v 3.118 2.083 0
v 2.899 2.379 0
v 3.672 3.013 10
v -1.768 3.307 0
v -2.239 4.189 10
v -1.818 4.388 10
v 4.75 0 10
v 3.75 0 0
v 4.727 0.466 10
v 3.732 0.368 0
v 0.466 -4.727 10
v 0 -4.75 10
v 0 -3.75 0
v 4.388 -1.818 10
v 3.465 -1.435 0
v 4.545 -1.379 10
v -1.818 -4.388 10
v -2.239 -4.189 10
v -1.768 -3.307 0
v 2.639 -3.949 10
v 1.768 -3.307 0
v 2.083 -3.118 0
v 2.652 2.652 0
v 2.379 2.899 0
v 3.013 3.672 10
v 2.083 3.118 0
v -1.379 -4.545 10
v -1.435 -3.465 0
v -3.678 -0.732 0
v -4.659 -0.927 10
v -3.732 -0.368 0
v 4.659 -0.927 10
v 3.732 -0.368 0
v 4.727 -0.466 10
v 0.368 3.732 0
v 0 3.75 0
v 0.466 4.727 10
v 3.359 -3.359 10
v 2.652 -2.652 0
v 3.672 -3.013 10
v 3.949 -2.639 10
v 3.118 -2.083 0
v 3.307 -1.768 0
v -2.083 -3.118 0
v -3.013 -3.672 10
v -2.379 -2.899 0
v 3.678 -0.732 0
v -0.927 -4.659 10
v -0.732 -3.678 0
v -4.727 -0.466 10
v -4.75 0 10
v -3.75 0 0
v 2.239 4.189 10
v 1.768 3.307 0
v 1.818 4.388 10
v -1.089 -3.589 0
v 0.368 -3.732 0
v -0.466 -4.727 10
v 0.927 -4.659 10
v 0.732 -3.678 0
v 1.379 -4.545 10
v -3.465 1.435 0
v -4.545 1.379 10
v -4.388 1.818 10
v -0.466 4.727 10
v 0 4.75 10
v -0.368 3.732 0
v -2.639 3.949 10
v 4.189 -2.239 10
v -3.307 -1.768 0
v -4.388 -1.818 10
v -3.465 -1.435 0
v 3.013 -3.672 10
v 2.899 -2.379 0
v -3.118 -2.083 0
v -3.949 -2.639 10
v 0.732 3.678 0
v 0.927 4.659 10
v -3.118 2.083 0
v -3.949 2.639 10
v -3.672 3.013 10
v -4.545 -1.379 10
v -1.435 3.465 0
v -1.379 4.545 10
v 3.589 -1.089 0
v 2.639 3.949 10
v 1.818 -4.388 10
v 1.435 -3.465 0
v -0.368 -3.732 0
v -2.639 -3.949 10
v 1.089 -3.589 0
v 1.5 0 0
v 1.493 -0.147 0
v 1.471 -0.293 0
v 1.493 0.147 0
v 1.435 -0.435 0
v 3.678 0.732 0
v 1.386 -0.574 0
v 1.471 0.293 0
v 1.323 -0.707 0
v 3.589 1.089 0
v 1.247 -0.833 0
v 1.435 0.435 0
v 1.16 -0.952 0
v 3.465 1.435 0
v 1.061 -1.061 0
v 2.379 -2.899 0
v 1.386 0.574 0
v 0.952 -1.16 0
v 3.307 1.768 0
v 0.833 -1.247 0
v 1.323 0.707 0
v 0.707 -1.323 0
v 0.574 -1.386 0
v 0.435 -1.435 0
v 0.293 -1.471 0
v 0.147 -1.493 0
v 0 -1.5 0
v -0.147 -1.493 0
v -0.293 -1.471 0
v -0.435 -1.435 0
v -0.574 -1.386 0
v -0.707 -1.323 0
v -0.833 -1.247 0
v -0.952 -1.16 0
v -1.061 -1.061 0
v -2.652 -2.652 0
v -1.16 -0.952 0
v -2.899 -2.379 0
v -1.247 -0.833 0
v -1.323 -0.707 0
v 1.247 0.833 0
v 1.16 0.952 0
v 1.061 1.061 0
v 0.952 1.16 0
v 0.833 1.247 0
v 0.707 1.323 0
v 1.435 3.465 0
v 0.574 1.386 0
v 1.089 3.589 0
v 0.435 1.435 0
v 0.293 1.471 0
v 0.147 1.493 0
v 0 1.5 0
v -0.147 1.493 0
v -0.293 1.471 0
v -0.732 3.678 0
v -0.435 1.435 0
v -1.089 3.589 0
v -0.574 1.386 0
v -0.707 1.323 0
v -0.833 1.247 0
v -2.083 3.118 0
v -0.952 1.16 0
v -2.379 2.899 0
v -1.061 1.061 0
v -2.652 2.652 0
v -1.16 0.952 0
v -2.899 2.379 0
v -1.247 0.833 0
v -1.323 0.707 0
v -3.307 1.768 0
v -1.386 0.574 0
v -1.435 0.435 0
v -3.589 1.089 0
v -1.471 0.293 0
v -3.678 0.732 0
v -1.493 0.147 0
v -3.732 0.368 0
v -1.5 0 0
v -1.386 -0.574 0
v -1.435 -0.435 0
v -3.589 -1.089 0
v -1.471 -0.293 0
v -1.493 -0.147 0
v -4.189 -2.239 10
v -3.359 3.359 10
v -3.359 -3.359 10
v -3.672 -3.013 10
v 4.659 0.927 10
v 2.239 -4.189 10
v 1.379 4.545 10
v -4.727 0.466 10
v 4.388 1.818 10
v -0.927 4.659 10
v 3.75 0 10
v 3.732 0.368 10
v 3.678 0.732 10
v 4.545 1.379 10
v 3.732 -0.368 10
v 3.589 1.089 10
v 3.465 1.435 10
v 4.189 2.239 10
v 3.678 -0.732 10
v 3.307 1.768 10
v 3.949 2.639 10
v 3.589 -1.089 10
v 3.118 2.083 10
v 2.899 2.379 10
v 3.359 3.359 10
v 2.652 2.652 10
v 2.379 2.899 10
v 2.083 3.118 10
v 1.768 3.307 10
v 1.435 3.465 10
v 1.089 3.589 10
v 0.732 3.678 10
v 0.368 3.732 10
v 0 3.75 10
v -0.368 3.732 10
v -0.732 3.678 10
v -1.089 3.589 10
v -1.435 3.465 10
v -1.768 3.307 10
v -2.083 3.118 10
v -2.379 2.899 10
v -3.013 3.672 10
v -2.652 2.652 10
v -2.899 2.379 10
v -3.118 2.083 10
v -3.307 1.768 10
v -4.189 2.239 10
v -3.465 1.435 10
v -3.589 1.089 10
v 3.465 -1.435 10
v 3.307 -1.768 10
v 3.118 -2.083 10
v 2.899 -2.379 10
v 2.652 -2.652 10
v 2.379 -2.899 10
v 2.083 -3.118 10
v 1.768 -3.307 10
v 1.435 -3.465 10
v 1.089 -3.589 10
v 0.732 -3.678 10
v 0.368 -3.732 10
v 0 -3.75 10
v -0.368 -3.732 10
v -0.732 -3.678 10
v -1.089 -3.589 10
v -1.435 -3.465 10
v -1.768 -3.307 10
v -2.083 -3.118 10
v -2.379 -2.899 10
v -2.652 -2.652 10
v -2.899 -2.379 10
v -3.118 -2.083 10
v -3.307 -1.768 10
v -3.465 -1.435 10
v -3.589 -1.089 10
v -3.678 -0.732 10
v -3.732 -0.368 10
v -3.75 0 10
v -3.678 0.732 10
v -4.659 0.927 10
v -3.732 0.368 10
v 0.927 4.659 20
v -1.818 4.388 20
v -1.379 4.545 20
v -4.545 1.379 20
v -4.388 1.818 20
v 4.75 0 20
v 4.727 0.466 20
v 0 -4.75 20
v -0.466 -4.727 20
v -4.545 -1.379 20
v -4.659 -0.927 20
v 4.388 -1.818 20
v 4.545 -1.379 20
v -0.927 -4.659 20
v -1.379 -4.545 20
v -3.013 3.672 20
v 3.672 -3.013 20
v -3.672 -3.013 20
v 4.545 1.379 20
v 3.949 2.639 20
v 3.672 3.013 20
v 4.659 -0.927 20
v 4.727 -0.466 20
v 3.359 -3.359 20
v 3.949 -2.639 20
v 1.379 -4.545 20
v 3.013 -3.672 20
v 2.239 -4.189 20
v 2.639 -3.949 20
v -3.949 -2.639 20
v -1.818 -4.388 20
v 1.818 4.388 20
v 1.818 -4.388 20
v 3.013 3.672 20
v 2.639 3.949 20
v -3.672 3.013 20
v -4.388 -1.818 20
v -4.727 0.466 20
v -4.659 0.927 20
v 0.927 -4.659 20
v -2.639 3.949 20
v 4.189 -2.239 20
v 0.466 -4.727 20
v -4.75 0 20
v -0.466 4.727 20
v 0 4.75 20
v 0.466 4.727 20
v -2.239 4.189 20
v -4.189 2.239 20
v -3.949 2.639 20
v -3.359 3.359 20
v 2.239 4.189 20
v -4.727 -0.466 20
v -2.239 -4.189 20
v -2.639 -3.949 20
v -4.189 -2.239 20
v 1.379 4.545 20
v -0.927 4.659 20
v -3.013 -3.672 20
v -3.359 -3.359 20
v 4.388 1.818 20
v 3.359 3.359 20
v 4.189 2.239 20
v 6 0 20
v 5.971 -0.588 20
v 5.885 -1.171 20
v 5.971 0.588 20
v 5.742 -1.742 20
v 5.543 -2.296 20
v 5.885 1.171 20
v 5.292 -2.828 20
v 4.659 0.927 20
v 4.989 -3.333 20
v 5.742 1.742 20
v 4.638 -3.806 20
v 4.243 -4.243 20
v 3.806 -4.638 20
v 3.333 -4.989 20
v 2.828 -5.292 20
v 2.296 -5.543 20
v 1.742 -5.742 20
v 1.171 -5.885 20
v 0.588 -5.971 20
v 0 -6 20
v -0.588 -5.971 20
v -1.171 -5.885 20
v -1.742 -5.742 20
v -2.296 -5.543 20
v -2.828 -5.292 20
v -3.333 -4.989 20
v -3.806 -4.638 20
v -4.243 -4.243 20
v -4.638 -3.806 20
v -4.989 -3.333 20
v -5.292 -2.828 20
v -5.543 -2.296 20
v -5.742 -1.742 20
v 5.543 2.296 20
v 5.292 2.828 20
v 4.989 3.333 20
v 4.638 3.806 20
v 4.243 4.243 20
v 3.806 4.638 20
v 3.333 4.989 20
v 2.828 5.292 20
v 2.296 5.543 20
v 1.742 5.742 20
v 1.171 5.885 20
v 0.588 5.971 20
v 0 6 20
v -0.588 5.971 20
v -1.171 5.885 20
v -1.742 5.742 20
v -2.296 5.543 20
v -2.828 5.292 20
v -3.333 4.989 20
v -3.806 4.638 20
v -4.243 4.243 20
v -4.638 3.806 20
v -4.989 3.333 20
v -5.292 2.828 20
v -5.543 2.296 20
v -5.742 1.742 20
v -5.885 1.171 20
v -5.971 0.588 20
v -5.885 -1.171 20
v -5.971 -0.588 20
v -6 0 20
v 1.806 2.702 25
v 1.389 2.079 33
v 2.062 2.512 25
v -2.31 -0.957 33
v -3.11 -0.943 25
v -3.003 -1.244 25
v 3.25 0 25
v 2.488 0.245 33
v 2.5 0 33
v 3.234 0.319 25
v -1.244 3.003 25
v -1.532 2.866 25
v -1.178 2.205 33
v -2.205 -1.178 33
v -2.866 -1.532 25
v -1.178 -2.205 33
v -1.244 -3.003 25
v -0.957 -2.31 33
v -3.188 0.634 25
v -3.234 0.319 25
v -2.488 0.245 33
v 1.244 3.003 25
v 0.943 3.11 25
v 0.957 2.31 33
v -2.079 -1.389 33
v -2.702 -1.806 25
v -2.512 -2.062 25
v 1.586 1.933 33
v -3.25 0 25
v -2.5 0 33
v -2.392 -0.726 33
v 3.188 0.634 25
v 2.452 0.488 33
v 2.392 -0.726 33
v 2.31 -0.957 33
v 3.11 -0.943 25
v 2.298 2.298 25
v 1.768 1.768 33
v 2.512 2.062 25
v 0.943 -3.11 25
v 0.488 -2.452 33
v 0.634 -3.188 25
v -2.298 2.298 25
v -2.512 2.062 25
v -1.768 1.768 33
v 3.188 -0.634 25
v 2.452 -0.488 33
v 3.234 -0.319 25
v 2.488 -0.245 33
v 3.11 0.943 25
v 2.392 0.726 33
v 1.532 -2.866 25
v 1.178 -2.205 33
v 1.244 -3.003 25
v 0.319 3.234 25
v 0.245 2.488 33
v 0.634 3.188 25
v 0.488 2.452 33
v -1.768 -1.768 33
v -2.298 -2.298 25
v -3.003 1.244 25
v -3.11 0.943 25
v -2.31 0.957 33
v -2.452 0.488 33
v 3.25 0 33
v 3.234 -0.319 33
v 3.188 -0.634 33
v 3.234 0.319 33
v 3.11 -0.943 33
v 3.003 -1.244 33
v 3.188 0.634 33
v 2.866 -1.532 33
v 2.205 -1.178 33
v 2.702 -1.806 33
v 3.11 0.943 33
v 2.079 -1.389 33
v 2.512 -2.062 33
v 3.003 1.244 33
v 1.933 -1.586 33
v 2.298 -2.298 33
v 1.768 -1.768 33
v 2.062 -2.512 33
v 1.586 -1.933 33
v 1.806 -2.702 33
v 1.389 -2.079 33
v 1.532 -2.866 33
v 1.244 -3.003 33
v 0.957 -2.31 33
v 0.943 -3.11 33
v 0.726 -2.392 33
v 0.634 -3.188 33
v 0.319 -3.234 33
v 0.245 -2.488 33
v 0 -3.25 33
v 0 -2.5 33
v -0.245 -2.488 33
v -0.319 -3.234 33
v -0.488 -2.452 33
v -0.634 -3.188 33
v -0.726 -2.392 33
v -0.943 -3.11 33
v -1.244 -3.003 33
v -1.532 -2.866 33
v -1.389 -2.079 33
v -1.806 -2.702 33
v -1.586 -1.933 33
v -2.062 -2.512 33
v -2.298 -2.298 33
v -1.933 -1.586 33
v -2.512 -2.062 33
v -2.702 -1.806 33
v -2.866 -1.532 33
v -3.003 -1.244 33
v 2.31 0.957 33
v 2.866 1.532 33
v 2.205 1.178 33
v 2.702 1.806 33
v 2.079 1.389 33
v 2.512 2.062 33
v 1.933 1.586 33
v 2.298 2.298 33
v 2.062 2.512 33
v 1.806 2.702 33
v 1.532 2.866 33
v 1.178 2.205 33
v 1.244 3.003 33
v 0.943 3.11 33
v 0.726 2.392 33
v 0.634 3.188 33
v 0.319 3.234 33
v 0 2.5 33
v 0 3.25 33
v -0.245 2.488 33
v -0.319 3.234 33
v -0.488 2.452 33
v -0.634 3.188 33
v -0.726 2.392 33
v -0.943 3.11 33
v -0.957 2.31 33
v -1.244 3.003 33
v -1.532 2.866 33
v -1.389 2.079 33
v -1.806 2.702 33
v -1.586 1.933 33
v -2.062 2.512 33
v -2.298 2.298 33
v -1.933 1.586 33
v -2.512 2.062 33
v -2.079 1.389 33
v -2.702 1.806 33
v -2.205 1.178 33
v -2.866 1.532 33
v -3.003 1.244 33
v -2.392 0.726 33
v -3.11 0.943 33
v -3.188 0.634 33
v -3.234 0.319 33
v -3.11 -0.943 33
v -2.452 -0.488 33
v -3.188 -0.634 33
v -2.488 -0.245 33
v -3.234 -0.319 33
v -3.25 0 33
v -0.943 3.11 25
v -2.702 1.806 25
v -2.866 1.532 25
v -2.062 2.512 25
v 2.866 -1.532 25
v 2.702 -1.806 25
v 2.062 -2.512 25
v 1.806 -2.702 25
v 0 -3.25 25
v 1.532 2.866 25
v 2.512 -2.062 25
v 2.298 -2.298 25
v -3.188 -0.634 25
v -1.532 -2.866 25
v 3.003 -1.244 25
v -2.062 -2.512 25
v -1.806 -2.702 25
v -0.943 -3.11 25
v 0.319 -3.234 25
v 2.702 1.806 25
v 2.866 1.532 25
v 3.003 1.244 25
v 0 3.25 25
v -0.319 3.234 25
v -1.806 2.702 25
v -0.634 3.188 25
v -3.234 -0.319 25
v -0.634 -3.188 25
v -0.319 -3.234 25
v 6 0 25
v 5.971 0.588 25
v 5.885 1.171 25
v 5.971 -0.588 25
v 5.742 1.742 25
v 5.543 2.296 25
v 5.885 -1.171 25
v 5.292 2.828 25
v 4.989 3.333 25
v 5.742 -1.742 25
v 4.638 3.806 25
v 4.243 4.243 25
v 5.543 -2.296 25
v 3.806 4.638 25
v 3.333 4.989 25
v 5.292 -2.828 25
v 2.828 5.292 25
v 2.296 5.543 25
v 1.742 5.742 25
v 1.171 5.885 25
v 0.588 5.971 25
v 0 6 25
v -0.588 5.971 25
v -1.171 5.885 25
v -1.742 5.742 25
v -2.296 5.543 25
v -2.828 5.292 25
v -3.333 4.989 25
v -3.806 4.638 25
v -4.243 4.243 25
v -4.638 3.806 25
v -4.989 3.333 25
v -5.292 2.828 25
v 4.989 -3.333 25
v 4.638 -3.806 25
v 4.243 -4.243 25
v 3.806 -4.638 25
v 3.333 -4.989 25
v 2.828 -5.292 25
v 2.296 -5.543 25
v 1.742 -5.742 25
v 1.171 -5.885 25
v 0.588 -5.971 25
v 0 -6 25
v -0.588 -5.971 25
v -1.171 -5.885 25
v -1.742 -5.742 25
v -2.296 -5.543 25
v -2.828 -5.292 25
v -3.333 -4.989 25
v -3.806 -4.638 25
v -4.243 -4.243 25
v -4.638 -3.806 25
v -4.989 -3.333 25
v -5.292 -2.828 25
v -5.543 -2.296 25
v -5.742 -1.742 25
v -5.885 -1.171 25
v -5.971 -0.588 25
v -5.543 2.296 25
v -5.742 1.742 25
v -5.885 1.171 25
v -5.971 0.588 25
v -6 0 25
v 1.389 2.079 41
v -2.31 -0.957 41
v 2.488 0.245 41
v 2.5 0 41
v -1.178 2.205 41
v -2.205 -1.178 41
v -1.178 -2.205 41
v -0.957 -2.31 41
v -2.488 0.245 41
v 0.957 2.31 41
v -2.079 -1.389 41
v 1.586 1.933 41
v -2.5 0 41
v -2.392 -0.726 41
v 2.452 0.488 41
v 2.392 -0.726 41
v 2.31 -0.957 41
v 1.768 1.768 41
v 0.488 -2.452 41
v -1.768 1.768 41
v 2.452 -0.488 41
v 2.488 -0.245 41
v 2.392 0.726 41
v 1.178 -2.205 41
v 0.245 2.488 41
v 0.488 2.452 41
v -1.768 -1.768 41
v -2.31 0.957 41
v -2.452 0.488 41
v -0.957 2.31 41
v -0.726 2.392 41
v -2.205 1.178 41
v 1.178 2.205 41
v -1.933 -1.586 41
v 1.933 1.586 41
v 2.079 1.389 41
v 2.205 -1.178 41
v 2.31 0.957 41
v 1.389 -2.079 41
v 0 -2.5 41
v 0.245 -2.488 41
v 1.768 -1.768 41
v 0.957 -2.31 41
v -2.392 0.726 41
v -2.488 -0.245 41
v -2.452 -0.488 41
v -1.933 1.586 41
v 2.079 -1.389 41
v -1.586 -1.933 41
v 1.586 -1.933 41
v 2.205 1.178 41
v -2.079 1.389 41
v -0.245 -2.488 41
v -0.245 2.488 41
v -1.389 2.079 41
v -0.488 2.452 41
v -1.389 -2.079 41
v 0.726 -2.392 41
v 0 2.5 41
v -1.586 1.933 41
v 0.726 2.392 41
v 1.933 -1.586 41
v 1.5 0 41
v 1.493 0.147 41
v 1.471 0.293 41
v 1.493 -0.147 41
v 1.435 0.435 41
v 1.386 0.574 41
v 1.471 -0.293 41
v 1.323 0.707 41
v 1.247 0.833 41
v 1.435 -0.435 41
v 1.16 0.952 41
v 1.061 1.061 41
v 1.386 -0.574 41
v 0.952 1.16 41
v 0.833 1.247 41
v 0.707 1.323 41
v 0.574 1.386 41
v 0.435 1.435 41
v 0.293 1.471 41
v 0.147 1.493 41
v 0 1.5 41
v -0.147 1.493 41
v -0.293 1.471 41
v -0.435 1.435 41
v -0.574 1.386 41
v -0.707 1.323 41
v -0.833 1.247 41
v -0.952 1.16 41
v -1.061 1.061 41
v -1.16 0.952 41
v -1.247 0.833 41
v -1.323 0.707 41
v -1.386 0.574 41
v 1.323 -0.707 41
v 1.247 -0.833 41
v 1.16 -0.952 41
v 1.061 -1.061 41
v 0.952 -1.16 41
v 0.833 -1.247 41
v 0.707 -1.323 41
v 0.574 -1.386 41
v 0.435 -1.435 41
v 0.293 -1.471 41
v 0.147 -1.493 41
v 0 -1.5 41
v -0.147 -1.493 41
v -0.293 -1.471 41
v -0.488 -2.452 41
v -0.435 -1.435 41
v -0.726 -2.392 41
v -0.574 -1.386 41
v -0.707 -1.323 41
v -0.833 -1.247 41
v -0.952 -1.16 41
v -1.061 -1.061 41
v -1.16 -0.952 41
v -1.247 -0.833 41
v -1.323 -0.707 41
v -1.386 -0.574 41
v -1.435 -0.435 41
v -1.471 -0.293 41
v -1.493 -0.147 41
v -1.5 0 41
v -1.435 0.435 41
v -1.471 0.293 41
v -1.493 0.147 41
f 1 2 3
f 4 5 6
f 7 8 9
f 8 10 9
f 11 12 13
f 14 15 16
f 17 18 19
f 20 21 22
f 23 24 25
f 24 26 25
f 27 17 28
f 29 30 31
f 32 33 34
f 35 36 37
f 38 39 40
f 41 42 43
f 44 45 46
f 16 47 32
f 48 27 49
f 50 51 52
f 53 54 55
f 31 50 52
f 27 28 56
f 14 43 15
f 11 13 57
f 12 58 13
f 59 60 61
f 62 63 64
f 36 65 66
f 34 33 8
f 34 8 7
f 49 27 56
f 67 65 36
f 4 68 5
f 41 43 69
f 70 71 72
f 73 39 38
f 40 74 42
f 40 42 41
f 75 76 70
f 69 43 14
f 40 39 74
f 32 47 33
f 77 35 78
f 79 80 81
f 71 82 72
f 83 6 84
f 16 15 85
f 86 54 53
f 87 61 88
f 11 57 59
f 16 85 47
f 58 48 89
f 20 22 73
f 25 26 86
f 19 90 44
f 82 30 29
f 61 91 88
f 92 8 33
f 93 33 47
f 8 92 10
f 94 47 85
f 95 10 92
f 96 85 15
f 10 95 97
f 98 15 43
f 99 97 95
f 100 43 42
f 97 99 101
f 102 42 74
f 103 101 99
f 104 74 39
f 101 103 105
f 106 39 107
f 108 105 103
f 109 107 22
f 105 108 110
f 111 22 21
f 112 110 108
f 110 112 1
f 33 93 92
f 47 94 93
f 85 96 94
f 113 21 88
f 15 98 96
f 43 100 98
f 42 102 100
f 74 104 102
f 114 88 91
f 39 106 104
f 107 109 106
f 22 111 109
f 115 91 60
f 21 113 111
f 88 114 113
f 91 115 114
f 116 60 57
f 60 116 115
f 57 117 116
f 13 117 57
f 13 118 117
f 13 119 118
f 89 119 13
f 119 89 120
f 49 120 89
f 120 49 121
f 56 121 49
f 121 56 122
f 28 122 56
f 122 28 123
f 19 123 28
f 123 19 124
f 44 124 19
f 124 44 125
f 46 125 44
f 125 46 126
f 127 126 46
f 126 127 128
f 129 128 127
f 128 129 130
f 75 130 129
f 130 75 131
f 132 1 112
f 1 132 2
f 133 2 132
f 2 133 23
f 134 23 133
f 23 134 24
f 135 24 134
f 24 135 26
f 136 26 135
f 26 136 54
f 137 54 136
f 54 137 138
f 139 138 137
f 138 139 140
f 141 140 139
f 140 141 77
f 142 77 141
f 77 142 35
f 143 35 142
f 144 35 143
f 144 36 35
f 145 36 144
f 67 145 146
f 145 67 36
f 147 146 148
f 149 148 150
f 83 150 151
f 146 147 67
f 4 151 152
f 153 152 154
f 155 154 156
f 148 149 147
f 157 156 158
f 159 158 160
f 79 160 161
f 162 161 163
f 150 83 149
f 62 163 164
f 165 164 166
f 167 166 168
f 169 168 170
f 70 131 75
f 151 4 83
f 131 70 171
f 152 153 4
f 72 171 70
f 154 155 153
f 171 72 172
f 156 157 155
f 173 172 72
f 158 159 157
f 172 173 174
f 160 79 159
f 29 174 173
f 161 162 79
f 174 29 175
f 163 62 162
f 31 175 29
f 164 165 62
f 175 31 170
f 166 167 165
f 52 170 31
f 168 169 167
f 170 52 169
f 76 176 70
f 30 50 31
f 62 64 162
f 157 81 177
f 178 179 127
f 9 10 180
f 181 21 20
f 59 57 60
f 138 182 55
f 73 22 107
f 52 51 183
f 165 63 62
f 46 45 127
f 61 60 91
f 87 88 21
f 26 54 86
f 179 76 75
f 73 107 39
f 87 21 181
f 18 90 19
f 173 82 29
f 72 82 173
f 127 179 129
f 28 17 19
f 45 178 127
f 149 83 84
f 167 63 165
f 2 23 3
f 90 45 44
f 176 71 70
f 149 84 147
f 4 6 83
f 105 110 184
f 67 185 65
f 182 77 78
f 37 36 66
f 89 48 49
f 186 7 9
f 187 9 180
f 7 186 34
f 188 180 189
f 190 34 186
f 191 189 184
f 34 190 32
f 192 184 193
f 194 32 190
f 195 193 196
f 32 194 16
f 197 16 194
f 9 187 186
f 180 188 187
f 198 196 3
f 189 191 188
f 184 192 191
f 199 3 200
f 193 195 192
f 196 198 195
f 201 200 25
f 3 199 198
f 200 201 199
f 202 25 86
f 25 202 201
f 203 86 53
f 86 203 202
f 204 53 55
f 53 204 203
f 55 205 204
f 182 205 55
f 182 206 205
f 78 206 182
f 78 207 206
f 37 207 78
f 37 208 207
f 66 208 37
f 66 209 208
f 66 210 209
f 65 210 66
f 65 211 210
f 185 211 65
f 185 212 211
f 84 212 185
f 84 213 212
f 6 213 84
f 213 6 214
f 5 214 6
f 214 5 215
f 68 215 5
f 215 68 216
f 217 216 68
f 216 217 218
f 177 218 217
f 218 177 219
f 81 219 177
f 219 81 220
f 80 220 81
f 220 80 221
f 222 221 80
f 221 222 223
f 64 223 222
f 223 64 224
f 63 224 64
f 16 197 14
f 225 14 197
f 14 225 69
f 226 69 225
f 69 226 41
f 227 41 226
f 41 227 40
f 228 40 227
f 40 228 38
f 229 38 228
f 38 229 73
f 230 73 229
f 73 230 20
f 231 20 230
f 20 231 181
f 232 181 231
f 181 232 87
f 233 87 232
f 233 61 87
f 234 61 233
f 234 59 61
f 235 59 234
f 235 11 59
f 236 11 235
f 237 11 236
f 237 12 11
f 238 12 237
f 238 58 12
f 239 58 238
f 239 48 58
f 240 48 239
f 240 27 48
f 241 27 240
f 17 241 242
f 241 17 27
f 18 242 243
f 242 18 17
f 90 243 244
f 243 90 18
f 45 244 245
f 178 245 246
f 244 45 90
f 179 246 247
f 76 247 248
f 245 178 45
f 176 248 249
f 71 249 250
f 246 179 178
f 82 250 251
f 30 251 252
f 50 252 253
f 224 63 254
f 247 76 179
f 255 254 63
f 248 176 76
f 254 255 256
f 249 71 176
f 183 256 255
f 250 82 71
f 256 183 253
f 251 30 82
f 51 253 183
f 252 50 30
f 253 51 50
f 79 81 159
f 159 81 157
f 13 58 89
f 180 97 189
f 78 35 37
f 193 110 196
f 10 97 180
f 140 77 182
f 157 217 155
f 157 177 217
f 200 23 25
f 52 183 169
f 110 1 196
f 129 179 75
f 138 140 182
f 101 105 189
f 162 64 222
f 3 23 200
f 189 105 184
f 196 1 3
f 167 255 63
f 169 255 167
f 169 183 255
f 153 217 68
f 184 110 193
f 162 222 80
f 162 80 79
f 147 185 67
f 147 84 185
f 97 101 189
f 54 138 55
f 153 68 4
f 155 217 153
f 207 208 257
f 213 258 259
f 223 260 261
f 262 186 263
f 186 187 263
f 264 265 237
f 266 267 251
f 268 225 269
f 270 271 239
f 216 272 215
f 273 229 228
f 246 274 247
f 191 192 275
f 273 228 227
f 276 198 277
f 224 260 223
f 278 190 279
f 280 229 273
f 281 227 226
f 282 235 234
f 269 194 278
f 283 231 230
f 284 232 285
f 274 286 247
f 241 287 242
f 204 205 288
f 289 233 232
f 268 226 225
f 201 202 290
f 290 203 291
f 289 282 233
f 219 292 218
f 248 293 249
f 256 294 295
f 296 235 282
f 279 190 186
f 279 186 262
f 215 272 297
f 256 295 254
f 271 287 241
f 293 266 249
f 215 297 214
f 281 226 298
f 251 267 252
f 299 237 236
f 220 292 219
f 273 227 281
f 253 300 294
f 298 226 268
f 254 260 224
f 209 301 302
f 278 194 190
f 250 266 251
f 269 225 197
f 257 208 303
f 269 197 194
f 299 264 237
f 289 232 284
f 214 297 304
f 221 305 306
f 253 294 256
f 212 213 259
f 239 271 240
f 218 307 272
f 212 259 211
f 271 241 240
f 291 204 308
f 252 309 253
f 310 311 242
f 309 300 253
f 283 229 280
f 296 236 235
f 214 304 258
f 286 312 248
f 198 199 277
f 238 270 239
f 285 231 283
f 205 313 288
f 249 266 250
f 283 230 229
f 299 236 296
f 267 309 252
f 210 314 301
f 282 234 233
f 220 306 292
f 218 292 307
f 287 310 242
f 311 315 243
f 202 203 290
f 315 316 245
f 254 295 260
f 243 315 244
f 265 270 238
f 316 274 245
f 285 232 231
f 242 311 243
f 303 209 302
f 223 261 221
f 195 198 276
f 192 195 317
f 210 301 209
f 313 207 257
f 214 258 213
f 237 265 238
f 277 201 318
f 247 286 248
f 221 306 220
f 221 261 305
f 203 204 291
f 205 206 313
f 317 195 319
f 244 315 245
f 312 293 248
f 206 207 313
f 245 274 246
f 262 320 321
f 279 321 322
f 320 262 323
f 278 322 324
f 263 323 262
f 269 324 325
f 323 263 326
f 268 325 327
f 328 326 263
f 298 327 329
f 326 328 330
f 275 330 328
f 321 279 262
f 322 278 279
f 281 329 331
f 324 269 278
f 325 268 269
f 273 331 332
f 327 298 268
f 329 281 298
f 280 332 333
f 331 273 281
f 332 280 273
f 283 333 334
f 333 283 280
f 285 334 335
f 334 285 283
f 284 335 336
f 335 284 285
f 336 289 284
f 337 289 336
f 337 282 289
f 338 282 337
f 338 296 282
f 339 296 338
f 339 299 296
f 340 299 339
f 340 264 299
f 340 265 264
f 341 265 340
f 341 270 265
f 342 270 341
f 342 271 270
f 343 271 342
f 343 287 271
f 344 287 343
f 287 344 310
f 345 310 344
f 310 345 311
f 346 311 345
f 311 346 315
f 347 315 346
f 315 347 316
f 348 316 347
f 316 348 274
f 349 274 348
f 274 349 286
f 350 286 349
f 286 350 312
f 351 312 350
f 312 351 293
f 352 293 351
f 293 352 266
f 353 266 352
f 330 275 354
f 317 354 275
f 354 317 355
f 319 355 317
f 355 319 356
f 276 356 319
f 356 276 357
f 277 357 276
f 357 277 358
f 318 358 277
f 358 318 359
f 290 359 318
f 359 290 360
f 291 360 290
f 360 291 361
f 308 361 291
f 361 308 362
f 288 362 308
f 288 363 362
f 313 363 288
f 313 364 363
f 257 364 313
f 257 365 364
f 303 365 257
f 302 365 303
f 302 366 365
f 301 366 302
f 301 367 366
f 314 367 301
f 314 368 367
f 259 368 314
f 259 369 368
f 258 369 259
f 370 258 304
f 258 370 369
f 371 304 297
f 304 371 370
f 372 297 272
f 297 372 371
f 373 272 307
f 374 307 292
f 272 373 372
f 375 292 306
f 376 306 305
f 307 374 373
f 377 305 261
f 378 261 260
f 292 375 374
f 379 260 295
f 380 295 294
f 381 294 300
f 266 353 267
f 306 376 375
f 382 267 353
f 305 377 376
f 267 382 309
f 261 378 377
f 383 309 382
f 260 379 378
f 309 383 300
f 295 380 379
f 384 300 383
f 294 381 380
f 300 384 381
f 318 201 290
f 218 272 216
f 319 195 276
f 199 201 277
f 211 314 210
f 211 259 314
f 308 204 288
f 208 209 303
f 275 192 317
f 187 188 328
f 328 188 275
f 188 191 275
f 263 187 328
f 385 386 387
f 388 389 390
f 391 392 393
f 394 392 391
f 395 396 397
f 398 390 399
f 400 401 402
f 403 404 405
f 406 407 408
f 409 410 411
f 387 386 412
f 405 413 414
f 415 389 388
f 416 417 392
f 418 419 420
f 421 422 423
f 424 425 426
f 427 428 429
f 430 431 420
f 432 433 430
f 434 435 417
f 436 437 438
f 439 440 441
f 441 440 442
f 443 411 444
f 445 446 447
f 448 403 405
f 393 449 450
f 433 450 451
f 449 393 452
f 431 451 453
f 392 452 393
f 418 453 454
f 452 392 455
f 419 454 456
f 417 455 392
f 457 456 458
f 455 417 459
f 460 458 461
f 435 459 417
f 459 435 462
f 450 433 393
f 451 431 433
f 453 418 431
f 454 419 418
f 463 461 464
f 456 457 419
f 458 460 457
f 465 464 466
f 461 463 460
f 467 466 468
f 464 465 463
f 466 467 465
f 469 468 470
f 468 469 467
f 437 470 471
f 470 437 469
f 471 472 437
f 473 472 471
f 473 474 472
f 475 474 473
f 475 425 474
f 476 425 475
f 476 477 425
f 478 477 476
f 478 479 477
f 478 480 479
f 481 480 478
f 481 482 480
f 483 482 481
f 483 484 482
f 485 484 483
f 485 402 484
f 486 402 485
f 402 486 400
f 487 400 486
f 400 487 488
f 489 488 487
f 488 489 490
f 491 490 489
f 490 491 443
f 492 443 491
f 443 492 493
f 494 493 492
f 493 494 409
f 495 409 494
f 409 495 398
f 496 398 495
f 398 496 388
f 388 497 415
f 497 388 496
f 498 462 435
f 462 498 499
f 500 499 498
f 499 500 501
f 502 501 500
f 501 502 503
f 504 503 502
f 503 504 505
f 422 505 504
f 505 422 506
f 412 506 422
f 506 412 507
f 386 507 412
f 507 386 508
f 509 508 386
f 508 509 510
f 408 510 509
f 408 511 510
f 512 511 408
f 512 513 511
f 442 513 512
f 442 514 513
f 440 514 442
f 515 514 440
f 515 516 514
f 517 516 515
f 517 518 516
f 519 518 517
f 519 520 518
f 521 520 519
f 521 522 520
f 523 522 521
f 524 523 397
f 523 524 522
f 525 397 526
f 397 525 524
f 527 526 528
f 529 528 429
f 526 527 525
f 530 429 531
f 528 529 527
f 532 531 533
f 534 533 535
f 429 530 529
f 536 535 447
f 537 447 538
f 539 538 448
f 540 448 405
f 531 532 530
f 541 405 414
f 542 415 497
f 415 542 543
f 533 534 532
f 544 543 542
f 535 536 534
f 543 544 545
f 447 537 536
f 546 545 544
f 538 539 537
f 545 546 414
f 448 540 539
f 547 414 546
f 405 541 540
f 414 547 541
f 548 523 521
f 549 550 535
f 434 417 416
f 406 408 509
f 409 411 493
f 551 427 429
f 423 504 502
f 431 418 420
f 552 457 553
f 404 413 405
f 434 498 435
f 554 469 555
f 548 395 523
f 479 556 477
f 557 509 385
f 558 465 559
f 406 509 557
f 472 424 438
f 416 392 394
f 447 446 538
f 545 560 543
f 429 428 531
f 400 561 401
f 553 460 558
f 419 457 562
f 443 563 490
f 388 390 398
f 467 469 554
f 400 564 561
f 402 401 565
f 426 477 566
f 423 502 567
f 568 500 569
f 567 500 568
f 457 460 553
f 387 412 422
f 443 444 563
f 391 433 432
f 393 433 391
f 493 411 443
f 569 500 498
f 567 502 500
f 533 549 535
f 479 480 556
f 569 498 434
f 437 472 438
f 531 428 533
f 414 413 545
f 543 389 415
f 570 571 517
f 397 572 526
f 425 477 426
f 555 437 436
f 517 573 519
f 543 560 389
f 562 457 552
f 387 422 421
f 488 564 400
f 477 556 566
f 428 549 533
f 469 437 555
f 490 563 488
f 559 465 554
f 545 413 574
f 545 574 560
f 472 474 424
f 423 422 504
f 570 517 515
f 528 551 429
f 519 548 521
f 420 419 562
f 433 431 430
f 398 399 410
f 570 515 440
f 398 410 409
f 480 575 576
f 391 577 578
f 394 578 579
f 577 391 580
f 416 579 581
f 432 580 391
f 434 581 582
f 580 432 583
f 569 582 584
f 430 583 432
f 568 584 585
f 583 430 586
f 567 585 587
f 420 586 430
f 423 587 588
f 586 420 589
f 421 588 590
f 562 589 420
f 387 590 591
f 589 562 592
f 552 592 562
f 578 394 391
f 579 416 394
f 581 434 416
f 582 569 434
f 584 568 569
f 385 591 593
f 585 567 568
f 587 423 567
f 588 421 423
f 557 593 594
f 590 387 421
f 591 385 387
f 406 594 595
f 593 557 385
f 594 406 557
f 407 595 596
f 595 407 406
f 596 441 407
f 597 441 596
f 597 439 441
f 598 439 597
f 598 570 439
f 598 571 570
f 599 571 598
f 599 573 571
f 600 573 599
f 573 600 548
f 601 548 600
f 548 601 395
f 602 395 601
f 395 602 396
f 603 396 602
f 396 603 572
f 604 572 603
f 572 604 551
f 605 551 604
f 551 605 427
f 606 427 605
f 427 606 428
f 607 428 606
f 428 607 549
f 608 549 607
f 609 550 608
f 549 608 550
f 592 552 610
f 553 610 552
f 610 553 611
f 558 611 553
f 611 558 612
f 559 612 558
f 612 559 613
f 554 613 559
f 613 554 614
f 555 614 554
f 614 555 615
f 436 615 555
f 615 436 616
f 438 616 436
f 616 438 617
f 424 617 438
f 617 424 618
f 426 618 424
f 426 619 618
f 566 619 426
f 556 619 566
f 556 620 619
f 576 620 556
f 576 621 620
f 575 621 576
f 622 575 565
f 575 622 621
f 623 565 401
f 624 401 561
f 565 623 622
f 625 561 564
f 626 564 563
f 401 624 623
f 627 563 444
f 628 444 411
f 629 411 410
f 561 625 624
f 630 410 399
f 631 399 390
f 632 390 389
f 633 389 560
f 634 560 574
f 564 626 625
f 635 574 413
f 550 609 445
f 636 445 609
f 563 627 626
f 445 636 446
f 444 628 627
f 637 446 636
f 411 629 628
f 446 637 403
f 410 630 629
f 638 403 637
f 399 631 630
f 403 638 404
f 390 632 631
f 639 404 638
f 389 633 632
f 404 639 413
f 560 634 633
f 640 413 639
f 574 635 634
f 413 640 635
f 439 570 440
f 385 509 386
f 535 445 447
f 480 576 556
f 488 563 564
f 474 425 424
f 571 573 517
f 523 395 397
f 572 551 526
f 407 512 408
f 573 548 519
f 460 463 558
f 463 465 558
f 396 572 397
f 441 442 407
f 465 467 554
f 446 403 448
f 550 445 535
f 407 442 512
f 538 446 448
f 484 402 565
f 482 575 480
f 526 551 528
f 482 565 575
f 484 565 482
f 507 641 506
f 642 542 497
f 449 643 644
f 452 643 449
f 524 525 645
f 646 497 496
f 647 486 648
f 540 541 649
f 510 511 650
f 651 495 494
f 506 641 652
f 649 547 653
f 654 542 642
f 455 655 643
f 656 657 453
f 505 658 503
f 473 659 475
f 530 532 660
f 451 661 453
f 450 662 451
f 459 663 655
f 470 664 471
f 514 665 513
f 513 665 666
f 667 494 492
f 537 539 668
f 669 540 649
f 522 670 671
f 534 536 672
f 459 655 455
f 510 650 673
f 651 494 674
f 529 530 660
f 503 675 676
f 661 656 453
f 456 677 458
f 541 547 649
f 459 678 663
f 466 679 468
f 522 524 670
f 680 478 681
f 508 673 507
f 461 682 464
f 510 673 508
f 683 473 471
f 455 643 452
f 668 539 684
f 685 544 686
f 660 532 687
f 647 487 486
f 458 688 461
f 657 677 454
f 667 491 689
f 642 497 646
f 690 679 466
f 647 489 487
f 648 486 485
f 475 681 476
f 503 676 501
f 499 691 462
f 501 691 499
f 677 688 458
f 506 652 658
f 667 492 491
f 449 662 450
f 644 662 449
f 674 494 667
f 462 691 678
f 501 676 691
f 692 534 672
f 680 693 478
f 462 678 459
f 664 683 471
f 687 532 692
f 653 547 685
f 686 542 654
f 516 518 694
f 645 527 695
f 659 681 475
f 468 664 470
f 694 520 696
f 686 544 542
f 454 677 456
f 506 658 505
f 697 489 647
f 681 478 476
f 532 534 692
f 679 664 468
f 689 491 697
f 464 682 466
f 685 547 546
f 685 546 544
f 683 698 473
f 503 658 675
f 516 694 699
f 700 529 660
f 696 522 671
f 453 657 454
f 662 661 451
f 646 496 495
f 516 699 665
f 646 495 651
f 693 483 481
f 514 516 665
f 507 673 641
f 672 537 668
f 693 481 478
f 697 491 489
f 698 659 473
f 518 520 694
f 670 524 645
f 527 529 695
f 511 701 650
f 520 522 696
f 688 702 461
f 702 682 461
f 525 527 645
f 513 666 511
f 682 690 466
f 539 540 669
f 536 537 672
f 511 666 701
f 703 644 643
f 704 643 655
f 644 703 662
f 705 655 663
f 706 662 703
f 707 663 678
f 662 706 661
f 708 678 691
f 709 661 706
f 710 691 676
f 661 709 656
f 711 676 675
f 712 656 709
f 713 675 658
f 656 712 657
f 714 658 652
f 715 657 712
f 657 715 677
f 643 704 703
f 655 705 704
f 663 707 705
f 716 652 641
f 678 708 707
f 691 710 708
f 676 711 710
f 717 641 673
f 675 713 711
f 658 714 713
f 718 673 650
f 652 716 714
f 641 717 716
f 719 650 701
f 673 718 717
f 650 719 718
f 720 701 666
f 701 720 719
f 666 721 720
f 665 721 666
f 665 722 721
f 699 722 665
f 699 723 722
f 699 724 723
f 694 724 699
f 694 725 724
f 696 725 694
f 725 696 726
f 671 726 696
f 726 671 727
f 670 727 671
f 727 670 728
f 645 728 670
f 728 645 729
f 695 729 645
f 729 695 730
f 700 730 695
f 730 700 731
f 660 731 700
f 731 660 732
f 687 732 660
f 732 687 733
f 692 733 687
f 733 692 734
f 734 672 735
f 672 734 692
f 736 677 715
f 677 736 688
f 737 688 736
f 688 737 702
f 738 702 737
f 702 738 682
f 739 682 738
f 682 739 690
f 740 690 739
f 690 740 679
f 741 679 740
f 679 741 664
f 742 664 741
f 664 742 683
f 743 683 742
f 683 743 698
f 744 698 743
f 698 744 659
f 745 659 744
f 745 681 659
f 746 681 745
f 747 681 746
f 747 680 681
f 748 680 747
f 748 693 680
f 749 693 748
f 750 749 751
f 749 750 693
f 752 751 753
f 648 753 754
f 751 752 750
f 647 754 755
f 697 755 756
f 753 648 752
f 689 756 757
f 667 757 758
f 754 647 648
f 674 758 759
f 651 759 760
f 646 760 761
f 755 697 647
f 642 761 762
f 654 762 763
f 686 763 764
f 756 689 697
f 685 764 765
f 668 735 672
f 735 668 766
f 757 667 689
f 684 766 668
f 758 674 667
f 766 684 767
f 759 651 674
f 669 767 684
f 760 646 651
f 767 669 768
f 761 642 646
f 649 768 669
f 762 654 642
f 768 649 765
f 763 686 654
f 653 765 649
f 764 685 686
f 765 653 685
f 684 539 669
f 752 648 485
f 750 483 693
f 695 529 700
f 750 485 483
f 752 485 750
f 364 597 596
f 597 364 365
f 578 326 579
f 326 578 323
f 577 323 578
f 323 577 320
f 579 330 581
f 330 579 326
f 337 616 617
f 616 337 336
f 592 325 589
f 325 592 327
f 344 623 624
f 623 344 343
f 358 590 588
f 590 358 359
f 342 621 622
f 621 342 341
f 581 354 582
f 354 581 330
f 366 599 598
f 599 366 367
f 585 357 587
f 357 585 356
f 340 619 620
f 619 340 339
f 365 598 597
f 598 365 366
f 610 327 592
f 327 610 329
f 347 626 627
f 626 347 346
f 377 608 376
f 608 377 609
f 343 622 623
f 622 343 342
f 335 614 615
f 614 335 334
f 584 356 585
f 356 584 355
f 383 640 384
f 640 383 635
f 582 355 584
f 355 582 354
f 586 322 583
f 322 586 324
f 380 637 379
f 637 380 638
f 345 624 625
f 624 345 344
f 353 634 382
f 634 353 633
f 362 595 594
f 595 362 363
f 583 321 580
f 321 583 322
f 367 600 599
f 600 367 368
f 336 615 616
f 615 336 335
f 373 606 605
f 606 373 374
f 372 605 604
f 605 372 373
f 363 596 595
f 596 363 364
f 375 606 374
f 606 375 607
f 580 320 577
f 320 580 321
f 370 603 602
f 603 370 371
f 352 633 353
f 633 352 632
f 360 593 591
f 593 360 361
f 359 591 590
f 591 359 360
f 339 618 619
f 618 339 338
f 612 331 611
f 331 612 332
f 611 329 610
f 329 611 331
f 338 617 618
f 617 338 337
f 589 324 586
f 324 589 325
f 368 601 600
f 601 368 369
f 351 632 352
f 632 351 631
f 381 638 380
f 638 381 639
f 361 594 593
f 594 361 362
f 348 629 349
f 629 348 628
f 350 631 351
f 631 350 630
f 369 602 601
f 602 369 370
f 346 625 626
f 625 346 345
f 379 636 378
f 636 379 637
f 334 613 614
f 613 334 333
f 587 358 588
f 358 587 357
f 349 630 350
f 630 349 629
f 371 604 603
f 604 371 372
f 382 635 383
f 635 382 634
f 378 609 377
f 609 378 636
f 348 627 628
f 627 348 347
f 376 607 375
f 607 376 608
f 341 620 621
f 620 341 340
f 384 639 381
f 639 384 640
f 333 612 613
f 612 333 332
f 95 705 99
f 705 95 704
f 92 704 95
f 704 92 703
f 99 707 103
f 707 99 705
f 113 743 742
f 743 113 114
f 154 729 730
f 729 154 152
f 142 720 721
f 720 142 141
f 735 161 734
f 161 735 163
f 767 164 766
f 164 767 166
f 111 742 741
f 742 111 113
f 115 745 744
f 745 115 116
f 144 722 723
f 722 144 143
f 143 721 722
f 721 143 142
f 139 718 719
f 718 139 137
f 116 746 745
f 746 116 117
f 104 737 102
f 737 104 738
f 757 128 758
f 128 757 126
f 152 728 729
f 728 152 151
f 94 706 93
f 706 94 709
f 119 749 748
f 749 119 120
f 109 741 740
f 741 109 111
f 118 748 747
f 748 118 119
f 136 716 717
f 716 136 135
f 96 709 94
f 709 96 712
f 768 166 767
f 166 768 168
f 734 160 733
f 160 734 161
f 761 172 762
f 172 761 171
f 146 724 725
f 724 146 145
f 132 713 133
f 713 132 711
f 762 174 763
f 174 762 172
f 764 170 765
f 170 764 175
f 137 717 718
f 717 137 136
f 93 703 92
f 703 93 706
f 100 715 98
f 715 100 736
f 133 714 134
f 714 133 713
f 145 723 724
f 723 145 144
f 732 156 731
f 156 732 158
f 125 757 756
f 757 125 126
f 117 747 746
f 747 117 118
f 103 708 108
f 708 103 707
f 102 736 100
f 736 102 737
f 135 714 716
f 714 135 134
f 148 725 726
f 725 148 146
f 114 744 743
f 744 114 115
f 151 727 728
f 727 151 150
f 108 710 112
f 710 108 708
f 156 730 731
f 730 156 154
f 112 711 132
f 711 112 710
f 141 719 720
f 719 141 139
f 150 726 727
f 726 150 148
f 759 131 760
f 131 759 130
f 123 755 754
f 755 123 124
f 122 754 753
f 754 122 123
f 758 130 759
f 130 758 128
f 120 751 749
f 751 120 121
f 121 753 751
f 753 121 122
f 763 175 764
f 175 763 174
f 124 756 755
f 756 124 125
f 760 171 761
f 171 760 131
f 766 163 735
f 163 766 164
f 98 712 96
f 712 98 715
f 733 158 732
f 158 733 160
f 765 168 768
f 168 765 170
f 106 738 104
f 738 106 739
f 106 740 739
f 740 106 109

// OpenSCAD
// --- Dimensions (mm) ---
bore_diameter = 3.0;           // Internal hole diameter
total_height = 41.0;           // Total height of the part

// 8mm Tubing Barb Section (Z = 0 to 20)
barb8_count = 2;               // Number of barbs for 8mm side
barb8_height = 10.0;           // Height of each barb
barb8_base_dia = 7.5;          // Bottom diameter of barb
barb8_top_dia = 9.5;           // Top diameter of barb

// Transition Collar (Z = 20 to 25)
collar_dia = 12.0;             // Diameter of the cylindrical collar
collar_height = 5.0;           // Height of the collar

// 5mm Tubing Barb Section (Z = 25 to 41)
barb5_count = 2;               // Number of barbs for 5mm side
barb5_height = 8.0;            // Height of each barb
barb5_base_dia = 6.5;          // Bottom diameter of barb
barb5_top_dia = 5.0;           // Top diameter of barb

// --- Constants ---
$fn = 64;

// --- Modules ---

// Module to create a single barb with a linear taper
module barb_shape(base_dia, top_dia, height) {
    cylinder(h = height, d1 = base_dia, d2 = top_dia);
}

// --- Main Construction ---

difference() {
    // The main body of the reducer
    union() {
        // 1. The 8mm Barb Section (Z = 0 to 20)
        // Two identical barbs, stacked.
        for (i = [0 : barb8_count - 1]) {
            translate([0, 0, i * barb8_height])
            barb_shape(barb8_base_dia, barb8_top_dia, barb8_height);
        }

        // 2. The Transition Collar (Z = 20 to 25)
        translate([0, 0, 20])
        cylinder(h = collar_height, d = collar_dia);

        // 3. The 5mm Barb Section (Z = 25 to 41)
        // Two identical barbs, stacked.
        for (i = [0 : barb5_count - 1]) {
            translate([0, 0, 25 + (i * barb5_height)])
            barb_shape(barb5_base_dia, barb5_top_dia, barb5_height);
        }
    }

    // Subtract the bore through the entire length
    // We extend the cylinder slightly beyond the bounds to ensure a clean cut
    translate([0, 0, -1])
    cylinder(h = total_height + 2, d = bore_diameter);
}
